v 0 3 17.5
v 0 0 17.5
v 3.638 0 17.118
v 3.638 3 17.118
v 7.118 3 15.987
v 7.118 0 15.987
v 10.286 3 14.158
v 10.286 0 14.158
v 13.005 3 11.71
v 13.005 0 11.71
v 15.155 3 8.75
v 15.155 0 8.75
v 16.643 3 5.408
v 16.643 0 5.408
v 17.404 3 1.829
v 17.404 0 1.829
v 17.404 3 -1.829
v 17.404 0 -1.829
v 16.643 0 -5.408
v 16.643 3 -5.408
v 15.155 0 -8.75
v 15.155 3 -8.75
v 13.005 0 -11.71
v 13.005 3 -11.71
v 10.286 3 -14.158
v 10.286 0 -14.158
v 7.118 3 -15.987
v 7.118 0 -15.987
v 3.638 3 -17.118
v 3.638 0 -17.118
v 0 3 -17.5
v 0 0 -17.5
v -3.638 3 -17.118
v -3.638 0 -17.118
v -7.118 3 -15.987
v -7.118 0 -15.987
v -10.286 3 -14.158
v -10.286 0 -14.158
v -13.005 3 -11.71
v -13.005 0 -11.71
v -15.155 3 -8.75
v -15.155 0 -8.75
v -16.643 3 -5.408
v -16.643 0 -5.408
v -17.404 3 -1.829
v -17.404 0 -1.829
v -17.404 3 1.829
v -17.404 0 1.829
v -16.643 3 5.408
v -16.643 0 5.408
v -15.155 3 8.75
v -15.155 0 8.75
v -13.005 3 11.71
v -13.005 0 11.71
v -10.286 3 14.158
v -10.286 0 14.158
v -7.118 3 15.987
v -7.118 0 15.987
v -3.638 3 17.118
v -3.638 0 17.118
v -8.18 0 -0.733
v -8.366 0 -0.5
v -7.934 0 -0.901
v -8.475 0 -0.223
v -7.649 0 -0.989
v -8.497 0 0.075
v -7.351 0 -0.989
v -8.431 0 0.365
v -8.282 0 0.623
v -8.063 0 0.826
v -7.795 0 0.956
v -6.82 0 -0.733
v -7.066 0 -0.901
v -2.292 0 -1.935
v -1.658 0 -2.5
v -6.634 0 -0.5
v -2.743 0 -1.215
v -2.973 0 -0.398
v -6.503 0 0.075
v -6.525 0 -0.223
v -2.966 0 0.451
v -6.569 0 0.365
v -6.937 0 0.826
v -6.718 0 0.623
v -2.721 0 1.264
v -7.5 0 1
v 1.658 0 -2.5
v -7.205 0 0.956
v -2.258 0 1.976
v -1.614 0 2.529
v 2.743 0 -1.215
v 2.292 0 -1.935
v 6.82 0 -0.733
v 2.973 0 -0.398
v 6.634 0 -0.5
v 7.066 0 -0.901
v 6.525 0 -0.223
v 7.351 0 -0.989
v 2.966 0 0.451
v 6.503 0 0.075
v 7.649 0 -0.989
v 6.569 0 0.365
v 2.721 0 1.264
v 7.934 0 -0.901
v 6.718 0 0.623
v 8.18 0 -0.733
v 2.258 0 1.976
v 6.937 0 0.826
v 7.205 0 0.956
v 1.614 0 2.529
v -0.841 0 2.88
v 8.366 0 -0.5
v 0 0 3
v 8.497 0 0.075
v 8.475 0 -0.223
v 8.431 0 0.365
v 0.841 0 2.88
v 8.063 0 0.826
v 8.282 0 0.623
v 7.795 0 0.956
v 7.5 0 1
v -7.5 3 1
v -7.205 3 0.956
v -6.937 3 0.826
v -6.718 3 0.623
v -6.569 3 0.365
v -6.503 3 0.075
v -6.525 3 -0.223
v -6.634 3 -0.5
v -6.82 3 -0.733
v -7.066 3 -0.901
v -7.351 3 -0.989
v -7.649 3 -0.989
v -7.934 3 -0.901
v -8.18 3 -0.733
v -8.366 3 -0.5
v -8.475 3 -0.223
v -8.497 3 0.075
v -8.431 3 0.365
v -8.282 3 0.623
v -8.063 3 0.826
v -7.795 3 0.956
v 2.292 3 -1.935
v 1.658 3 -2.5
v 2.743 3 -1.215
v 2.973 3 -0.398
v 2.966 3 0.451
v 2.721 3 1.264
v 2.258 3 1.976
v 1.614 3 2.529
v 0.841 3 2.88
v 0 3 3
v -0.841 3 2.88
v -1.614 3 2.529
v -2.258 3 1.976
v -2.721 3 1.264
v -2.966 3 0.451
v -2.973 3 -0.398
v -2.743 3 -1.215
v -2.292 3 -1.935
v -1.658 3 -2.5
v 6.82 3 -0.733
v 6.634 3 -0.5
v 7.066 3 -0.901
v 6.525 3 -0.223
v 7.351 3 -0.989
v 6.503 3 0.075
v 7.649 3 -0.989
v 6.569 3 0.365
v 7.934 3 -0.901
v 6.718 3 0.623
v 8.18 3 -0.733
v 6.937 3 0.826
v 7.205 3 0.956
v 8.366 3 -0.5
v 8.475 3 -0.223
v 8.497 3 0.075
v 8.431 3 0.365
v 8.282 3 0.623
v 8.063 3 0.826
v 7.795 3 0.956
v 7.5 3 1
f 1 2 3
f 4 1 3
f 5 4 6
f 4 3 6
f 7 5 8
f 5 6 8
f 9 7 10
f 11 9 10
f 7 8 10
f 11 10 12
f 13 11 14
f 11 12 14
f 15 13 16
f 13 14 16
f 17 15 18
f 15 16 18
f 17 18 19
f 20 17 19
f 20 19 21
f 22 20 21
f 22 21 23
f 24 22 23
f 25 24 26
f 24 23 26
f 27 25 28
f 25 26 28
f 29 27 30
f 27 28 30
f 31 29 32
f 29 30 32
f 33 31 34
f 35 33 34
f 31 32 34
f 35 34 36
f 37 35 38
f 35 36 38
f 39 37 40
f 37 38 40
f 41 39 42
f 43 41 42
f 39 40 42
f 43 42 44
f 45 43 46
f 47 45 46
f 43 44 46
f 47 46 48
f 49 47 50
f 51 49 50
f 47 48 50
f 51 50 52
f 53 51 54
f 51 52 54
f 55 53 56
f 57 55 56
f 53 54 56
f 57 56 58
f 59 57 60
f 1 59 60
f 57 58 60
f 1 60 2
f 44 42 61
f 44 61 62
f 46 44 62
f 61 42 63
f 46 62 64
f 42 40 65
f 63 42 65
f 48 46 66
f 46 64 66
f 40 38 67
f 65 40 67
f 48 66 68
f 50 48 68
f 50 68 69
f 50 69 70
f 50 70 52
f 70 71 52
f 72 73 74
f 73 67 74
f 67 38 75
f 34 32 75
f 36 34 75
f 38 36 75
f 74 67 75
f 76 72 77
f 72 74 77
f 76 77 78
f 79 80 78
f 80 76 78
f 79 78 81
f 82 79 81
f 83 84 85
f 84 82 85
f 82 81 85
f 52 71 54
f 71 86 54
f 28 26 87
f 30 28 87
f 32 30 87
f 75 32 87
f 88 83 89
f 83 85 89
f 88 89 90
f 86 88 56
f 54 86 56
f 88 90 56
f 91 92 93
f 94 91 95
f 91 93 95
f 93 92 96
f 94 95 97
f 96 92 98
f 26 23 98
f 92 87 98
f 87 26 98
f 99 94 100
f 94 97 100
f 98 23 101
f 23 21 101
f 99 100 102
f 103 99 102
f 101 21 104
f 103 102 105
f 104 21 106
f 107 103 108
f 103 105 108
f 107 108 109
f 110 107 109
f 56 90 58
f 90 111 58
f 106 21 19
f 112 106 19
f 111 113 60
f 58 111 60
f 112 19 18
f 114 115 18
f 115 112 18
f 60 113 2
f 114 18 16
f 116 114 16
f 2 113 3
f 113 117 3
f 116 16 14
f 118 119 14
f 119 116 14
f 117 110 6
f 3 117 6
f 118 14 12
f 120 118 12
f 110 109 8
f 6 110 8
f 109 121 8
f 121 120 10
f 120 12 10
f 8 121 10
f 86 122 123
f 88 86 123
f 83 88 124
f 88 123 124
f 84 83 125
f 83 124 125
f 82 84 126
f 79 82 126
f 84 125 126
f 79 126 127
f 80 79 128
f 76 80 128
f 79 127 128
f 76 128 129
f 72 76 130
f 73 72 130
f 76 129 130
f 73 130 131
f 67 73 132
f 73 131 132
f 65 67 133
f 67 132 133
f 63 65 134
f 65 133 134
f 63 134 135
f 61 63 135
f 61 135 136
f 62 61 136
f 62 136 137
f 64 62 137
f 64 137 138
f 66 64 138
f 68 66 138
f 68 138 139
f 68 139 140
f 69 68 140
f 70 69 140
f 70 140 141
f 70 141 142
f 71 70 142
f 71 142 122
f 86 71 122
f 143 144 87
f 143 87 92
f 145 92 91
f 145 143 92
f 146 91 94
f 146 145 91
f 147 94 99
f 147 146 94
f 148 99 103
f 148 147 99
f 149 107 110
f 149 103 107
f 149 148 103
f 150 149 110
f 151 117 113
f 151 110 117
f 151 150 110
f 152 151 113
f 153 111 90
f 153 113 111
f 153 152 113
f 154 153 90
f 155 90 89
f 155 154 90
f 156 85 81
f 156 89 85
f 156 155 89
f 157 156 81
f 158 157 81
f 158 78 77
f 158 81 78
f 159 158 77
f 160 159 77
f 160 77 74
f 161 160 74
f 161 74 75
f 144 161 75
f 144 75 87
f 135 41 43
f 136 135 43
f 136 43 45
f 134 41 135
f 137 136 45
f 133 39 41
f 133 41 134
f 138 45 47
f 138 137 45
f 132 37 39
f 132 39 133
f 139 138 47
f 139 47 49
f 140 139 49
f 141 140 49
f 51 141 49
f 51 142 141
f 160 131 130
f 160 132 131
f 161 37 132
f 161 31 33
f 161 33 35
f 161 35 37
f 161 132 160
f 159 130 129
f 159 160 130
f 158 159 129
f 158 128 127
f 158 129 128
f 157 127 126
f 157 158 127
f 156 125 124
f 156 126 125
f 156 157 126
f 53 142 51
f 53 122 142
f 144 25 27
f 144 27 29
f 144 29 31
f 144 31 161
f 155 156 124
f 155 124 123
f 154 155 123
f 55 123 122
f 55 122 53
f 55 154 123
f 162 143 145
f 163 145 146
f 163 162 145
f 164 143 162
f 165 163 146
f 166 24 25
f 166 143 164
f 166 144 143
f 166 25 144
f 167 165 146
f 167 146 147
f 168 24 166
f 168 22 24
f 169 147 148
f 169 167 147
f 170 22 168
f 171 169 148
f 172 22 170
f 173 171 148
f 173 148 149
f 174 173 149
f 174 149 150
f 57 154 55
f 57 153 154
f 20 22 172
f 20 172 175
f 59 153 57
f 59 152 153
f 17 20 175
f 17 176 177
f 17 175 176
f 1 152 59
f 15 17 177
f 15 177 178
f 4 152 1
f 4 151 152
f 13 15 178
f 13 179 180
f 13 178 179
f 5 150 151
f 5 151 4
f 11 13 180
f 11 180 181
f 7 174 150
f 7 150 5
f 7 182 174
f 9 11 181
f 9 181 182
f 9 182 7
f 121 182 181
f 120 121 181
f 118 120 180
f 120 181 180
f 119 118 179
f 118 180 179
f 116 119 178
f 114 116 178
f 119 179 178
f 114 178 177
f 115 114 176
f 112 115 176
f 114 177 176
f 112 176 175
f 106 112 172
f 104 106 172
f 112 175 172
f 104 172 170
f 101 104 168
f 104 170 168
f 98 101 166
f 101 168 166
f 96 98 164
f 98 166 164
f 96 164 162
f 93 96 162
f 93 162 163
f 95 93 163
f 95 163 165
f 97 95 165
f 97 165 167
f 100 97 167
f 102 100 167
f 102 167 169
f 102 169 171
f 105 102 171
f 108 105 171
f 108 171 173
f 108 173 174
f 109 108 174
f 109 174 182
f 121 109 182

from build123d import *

# Parameters (mm, degrees)
SKIZZE1_R                       = 17.5
AUFSATZ_LINEAR_AUSTRAGEN1_DEPTH = 3
SKIZZE2_R                       = 1
SCHNITT_LINEAR_AUSTRAGEN1_DEPTH = 25.929901725


with BuildPart() as part:
    # Skizze1 → Aufsatz-Linear austragen1 (new body)
    with BuildSketch(Plane(origin=(0, 0, 0), x_dir=(1, 0, 0), z_dir=(0, 1, 0))):
        with Locations(Location((0, 0, 0), (0, 0, 270))):
            Circle(SKIZZE1_R)
    extrude(amount=AUFSATZ_LINEAR_AUSTRAGEN1_DEPTH)

    # Skizze2 → Schnitt-Linear austragen1 (cut, through all)
    with BuildSketch(Plane(origin=(0, 3, 0), x_dir=(1, 0, 0), z_dir=(0, 1, 0))):
        with Locations(Location((-7.5, 0, 0), (0, 0, 270))):
            Circle(SKIZZE2_R)
        with Locations(Location((7.5, 0, 0), (0, 0, 270))):
            Circle(SKIZZE2_R)
        with BuildLine():
            Line((-1.658312395, 2.5), (1.658312395, 2.5))
            ThreePointArc((1.658312395, 2.5), (0, -3), (-1.658312395, 2.5))
        make_face()
    extrude(amount=-SCHNITT_LINEAR_AUSTRAGEN1_DEPTH, mode=Mode.SUBTRACT)


solid = part.part
